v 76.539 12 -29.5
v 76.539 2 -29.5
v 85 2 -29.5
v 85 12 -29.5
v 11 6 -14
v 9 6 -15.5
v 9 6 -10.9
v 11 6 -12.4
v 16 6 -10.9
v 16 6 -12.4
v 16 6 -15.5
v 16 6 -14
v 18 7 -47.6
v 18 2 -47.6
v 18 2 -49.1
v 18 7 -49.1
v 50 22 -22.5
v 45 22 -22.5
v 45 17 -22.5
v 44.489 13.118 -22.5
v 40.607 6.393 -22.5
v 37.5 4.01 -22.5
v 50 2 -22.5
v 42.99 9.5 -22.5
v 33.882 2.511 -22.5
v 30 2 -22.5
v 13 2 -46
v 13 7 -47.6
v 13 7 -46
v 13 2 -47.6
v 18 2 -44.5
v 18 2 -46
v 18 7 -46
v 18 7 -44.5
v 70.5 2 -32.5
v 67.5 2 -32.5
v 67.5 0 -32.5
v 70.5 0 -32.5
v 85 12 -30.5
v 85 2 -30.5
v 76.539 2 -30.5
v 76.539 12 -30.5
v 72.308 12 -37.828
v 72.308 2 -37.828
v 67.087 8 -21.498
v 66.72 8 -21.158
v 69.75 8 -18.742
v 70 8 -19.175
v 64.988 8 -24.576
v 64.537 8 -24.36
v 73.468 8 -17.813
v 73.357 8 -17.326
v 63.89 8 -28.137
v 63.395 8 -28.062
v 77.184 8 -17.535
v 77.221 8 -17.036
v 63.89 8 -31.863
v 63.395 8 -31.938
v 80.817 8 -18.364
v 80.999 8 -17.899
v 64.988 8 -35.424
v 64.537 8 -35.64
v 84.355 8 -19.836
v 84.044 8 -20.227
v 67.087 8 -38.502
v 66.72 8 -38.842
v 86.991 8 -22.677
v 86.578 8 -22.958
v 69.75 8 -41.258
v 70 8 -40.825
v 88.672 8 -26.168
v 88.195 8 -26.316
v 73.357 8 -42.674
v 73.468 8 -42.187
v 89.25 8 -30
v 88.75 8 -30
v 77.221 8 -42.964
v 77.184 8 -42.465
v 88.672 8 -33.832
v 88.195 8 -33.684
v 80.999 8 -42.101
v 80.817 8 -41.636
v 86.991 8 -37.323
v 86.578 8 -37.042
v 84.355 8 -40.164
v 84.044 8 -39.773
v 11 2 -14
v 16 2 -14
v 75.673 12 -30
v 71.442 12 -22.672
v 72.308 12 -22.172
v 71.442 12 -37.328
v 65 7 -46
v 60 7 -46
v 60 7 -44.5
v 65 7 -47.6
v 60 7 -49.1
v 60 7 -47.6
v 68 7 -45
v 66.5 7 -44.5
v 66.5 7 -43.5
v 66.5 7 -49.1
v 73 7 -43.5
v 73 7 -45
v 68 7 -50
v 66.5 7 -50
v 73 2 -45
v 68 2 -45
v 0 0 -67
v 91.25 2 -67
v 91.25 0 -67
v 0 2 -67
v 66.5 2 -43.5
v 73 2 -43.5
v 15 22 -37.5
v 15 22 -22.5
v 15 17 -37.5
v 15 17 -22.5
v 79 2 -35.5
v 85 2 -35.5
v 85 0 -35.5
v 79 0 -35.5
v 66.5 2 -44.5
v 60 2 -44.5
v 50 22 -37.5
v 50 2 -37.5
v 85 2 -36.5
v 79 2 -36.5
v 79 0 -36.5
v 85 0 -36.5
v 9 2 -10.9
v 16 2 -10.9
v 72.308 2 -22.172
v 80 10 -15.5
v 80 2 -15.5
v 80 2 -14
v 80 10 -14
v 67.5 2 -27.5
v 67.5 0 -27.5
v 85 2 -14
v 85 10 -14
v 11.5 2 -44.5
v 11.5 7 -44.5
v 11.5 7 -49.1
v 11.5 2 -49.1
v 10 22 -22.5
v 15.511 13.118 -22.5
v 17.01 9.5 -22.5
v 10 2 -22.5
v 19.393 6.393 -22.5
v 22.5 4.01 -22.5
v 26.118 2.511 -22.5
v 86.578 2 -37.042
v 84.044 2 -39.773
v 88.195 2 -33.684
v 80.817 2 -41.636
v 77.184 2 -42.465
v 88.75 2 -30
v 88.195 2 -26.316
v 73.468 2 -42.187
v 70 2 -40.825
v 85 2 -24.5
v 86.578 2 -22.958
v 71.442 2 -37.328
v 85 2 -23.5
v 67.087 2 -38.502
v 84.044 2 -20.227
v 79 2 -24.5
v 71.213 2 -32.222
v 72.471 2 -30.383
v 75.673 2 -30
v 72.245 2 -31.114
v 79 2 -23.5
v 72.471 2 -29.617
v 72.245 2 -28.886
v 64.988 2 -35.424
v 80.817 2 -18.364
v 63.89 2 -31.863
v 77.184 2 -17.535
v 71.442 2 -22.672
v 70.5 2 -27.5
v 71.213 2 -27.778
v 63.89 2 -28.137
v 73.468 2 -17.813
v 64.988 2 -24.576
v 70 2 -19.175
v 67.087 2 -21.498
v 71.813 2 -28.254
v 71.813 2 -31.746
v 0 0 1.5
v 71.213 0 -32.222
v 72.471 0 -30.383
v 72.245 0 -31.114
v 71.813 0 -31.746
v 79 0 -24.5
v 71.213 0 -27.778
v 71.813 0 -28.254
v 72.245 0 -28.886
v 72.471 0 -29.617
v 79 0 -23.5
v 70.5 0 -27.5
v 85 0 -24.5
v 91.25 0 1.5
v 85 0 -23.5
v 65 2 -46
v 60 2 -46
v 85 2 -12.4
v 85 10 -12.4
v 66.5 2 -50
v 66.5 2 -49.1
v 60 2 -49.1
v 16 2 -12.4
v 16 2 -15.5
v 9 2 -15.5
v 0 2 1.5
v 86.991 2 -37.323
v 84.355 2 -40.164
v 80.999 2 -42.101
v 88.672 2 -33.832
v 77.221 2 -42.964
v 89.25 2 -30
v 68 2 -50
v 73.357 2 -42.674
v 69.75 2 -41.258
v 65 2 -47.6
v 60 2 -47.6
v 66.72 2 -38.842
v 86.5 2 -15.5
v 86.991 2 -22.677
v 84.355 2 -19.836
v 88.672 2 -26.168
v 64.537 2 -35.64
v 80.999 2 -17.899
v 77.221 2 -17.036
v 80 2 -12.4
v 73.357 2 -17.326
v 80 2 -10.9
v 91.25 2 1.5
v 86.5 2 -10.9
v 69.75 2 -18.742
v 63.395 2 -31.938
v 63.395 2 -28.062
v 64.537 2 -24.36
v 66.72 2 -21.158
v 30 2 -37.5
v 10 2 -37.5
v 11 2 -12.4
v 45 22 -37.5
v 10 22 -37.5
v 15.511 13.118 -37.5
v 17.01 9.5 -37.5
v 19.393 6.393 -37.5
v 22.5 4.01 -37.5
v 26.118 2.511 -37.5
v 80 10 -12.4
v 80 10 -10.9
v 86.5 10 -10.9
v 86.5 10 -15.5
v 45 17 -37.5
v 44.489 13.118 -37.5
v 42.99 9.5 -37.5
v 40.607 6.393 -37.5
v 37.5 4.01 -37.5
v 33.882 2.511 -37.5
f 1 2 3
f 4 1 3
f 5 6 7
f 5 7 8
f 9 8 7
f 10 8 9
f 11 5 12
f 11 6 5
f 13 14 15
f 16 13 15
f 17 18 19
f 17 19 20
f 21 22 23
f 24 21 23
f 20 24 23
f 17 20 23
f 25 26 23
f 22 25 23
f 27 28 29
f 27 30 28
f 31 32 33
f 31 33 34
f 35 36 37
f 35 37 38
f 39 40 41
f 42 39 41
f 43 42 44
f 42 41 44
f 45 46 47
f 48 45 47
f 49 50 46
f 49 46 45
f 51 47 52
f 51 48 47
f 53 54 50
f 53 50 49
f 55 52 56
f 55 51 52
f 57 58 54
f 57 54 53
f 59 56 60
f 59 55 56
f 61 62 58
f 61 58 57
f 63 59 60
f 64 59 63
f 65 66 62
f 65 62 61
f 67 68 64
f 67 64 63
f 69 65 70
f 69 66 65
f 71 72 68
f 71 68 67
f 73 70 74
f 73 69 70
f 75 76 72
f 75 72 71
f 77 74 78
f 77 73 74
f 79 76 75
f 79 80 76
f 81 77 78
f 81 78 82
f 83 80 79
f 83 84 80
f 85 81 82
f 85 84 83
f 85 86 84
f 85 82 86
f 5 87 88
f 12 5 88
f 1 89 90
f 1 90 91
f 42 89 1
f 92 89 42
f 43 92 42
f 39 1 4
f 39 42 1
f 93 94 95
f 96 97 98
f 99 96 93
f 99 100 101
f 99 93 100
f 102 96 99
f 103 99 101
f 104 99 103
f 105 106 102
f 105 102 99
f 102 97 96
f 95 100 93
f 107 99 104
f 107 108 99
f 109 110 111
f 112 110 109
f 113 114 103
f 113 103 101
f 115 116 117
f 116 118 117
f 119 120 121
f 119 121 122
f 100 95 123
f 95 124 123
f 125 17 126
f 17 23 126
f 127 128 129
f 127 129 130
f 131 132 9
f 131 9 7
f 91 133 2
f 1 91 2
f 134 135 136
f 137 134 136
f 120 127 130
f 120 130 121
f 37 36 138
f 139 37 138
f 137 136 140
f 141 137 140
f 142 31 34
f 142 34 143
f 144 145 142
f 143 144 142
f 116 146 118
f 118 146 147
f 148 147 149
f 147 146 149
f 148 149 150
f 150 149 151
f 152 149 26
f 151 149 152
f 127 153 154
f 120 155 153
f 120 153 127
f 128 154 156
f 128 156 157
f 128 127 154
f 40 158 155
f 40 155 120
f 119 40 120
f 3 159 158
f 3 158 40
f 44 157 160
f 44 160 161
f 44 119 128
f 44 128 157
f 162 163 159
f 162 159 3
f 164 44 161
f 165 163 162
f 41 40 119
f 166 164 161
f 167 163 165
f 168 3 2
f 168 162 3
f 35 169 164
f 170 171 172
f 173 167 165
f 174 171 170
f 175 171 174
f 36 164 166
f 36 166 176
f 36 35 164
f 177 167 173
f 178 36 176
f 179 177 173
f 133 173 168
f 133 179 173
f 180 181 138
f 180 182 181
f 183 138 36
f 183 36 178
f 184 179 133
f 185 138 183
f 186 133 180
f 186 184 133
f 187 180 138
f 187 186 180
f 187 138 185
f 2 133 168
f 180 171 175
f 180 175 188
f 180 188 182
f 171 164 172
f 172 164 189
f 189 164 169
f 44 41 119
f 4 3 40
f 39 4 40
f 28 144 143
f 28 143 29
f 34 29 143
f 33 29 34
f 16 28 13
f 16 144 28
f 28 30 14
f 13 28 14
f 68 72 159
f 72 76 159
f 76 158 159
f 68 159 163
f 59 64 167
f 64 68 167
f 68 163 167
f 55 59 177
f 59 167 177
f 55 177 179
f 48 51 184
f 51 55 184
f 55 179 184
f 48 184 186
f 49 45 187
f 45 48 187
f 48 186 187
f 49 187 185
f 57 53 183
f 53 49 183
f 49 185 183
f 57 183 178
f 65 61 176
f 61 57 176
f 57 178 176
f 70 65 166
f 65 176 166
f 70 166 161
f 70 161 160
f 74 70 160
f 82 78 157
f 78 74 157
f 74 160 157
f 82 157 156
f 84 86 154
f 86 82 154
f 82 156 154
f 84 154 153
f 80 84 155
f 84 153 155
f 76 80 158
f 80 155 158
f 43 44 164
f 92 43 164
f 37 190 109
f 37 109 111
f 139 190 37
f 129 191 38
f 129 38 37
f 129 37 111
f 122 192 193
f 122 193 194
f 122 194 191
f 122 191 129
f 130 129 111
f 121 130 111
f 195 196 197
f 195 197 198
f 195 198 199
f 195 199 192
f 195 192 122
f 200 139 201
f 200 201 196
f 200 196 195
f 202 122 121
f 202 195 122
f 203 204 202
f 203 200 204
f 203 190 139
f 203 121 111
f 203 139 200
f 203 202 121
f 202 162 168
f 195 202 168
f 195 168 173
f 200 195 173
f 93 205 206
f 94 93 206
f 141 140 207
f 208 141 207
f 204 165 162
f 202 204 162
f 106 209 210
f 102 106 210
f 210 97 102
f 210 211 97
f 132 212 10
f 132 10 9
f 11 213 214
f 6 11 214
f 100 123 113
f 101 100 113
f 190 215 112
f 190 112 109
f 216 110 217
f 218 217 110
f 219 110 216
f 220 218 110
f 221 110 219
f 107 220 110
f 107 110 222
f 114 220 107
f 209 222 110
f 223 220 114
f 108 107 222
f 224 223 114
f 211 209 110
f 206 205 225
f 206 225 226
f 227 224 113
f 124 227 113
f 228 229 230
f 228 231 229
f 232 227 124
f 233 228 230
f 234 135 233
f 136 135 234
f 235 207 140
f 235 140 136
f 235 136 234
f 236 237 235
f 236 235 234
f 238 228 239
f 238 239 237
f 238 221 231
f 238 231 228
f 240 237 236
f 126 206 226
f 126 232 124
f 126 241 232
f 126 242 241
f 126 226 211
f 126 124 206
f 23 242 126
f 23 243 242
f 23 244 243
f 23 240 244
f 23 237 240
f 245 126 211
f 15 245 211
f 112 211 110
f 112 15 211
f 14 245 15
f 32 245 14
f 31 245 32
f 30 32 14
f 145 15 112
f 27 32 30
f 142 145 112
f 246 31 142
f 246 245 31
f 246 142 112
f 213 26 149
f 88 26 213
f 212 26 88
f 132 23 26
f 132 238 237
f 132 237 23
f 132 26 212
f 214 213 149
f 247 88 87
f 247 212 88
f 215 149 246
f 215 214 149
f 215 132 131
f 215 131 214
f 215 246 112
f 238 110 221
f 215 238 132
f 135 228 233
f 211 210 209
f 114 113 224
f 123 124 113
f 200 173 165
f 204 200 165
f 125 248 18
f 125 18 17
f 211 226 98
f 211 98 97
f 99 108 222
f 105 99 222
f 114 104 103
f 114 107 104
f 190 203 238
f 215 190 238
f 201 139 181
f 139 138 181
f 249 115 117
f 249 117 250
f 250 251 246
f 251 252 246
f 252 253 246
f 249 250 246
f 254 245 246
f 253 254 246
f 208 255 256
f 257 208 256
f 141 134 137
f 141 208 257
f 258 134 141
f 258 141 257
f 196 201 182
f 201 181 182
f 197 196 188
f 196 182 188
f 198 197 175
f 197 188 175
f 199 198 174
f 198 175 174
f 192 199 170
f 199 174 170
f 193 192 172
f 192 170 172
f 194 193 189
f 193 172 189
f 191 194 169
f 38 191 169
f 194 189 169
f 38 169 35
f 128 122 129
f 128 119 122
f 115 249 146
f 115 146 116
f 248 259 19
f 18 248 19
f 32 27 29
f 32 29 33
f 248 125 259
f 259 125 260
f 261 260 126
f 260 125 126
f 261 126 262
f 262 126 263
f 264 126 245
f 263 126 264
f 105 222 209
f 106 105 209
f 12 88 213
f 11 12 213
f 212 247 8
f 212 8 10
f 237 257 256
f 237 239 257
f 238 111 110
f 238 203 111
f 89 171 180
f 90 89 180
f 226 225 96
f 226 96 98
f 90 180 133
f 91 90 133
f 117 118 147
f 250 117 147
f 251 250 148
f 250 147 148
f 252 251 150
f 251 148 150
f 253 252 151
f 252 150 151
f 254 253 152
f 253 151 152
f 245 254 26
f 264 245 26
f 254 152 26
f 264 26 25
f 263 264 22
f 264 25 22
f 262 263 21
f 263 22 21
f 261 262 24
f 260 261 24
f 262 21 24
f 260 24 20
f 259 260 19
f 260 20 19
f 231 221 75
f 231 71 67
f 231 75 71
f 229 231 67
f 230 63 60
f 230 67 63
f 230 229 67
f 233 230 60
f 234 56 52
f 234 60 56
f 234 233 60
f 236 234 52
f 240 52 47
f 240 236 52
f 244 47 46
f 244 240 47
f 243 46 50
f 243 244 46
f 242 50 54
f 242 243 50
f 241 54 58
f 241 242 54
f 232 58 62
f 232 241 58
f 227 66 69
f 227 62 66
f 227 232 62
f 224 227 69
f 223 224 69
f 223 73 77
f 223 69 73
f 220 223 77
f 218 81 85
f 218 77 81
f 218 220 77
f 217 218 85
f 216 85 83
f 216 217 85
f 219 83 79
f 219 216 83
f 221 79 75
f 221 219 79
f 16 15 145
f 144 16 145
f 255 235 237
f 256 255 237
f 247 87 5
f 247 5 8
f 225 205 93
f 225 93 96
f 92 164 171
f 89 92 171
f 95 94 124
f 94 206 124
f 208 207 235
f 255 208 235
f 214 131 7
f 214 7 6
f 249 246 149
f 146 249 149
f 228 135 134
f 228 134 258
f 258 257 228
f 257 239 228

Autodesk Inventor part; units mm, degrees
ref_plane "YZ Plane" through (0, 0, 0) normal (1, 0, 0) x (0, 1, 0)
ref_plane "XZ Plane" through (0, 0, 0) normal (0, 1, 0) x (-1, 0, 0)
ref_plane "XY Plane" through (0, 0, 0) normal (0, 0, 1) x (1, 0, 0)
sketch "Sketch1" plane through (0, 0, 0) normal (0, 1, 0) x (-1, 0, 0)
  line L0 (0, 0) -> (-90, 0)
  line L1 (-90, 0) -> (-90, -60)
  line L2 (-90, -60) -> (0, -60)
  line L3 (0, -60) -> (0, 0)
  dimension "d0" = 90
  dimension "d1" = 60
extrude "Extrusion1" add sketch "Sketch1" along normal blind 2
sketch "Sketch2" plane through (0, 2, 0) normal (0, 1, 0) x (1, 0, 0)
  line L0 (90, 0) -> (90, 60) construction
  line L1 (90, 60) -> (85, 60) construction
  line L2 (90, 60) -> (0, 60) construction
  line L3 (85, 60) -> (85, 0) construction
  line L4 (0, 0) -> (90, 0) construction
  line L5 (85, 30) -> (85, 35.5) construction
  line L6 (85, 35.5) -> (85, 30) construction
  line L7 (85, 30) -> (85, 24.5) construction
  line L8 (85, 24.5) -> (79, 24.5)
  line L9 (79, 24.5) -> (79, 23.5)
  line L10 (79, 23.5) -> (85, 23.5)
  line L11 (85, 23.5) -> (85, 24.5)
  line L12 (85, 35.5) -> (79, 35.5)
  line L13 (79, 35.5) -> (79, 36.5)
  line L14 (79, 36.5) -> (85, 36.5)
  line L15 (85, 36.5) -> (85, 35.5)
  dimension "d4" = 5
  dimension "d5" = 5.5
  dimension "d6" = 5.5
  dimension "d7" = 6
  dimension "d8" = 1
  dimension "d9" = 1
extrude "Extrusion2" cut sketch "Sketch2" against normal through all
sketch "Sketch3" plane through (0, 2, 0) normal (0, 1, 0) x (1, 0, 0)
  line L0 (85, 35.5) -> (79, 35.5) construction
  line L1 (85, 24.5) -> (79, 24.5) construction
  line L2 (79, 35.5) -> (79, 24.5) construction
  line L3 (79, 30) -> (72.5, 30) construction
  line L4 (72.5, 30) -> (72.5, 32.5) construction
  line L5 (72.5, 32.5) -> (67.5, 32.5) construction
  line L6 (67.5, 32.5) -> (67.5, 27.5) construction
  line L7 (67.5, 27.5) -> (72.5, 27.5) construction
  line L8 (72.5, 27.5) -> (72.5, 32.5) construction
  line L9 (67.5, 27.5) -> (70.5, 27.5) construction
  line L10 (67.5, 32.5) -> (70.5, 32.5) construction
  arc A0 (70.5, 27.5) -> (70.5, 32.5) centre (69.9375, 30) ccw
  line L11 (70.5, 32.5) -> (67.5, 32.5) construction
  line L12 (67.5, 32.5) -> (67.5, 27.5) construction
  line L13 (67.5, 32.5) -> (70.5, 32.5)
  line L14 (67.5, 32.5) -> (67.5, 27.5)
  line L15 (67.5, 27.5) -> (70.5, 27.5)
  point P0 (0, 0)
  dimension "d12" = 6.5
  dimension "d15" = 2.5
  dimension "d16" = 5
  dimension "d17" = 5
  dimension "d18" = 3
  dimension "d19" = 3
extrude "Extrusion3" cut sketch "Sketch3" against normal through all
sketch "Sketch5" plane through (0, 2, 0) normal (0, 1, 0) x (1, 0, 0)
  line L0 (85, 35.5) -> (85, 36.5) construction
  line L1 (85, 36.5) -> (67.5, 36.5) construction
  line L2 (67.5, 36.5) -> (67.5, 23.5) construction
  line L3 (67.5, 23.5) -> (85, 23.5) construction
  line L4 (85, 23.5) -> (85, 36.5) construction
  circle A0 centre (76.25, 30) radius 12.5 construction
  line L5 (76.25, 30) -> (85, 30) construction
  line L6 (85, 30) -> (85, 30.5) construction
  line L7 (85, 30.5) -> (76.25, 30.5)
  line L8 (76.25, 30.5) -> (76.25, 29.5)
  line L9 (76.25, 29.5) -> (85, 29.5)
  line L10 (85, 29.5) -> (85, 30.5)
  line L11 (76.25, 30) -> (71.875, 37.5777) construction
  line L12 (71.875, 37.5777) -> (71.442, 37.3277) construction
  line L13 (71.442, 37.3277) -> (75.817, 29.75)
  line L14 (75.817, 29.75) -> (76.683, 30.25)
  line L15 (76.683, 30.25) -> (72.308, 37.8277)
  line L16 (72.308, 37.8277) -> (71.442, 37.3277)
  line L17 (76.25, 30) -> (71.875, 22.4223) construction
  line L18 (71.875, 22.4223) -> (72.308, 22.1723) construction
  line L19 (72.308, 22.1723) -> (76.683, 29.75)
  line L20 (76.683, 29.75) -> (75.817, 30.25)
  line L21 (75.817, 30.25) -> (71.442, 22.6723)
  line L22 (71.442, 22.6723) -> (72.308, 22.1723)
  point P0 (0, 0)
  dimension "d32" = 13
  dimension "d33" = 25
  dimension "d34" = 0.5
  dimension "d35" = 1
  dimension "d38" = 360
extrude "Extrusion4" add sketch "Sketch5" along normal blind 10
sketch "Sketch6" plane through (0, 2, 0) normal (0, 1, 0) x (1, 0, 0)
  line L0 (85, 36.5) -> (85, 35.5) construction
  line L1 (85, 36.5) -> (67.5, 36.5) construction
  line L2 (67.5, 36.5) -> (67.5, 23.5) construction
  line L3 (67.5, 23.5) -> (85, 23.5) construction
  line L4 (85, 23.5) -> (85, 36.5) construction
  circle A0 centre (76.25, 30) radius 12.5
  circle A1 centre (76.25, 30) radius 13
  point P0 (0, 0)
  dimension "d42" = 13
  dimension "d43" = 25
  dimension "d44" = 26
extrude "Extrusion5" add sketch "Sketch6" along normal blind 6
sketch "Sketch7" plane through (0, 2, 0) normal (0, 1, 0) x (1, 0, 0)
  line L0 (90, 0) -> (90, 60) construction
  line L1 (90, 30) -> (90, 14) construction
  line L2 (90, 14) -> (0, 14) construction
  line L3 (0, 60) -> (0, 0) construction
  line L4 (90, 14) -> (85, 14) construction
  line L5 (85, 14) -> (11, 14) construction
  line L6 (11, 14) -> (11, 12.4) construction
  line L7 (11, 12.4) -> (85, 12.4) construction
  line L8 (85, 12.4) -> (85, 14) construction
  line L9 (85, 14) -> (85, 12.4)
  line L10 (85, 12.4) -> (80, 12.4)
  line L11 (85, 14) -> (80, 14)
  line L12 (80, 14) -> (80, 15.5)
  line L13 (80, 12.4) -> (80, 10.9)
  line L14 (11, 14) -> (16, 14)
  line L15 (16, 14) -> (16, 15.5)
  line L16 (16, 15.5) -> (9, 15.5)
  line L17 (11, 14) -> (11, 12.4)
  line L18 (11, 12.4) -> (16, 12.4)
  line L19 (16, 12.4) -> (16, 10.9)
  line L20 (16, 10.9) -> (9, 10.9)
  line L21 (9, 10.9) -> (9, 15.5)
  line L22 (80, 15.5) -> (86.5, 15.5)
  line L23 (80, 10.9) -> (86.5, 10.9)
  line L24 (86.5, 10.9) -> (86.5, 15.5)
  dimension "d47" = 16
  dimension "d48" = 5
  dimension "d49" = 74
  dimension "d50" = 1.6
  dimension "d51" = 5
  dimension "d52" = 5
  dimension "d53" = 1.5
  dimension "d55" = 1.5
  dimension "d57" = 5
  dimension "d58" = 1.5
  dimension "d59" = 7
  dimension "d60" = 5
  dimension "d61" = 1.5
  dimension "d62" = 6.5
  dimension "d63" = 6.5
extrude "Extrusion6" add sketch "Sketch7" along normal blind 4
sketch "Sketch8" plane through (0, 6, 0) normal (0, 1, 0) x (1, 0, 0)
  line L0 (80, 15.5) -> (80, 14) projected
  line L1 (80, 14) -> (80, 15.5)
  line L2 (86.5, 10.9) -> (86.5, 15.5) projected
  line L3 (80, 15.5) -> (86.5, 15.5)
  line L4 (86.5, 15.5) -> (86.5, 10.9)
  line L5 (80, 12.4) -> (80, 10.9) projected
  line L6 (86.5, 10.9) -> (80, 10.9)
  line L7 (80, 10.9) -> (80, 12.4)
  line L8 (85, 12.4) -> (80, 12.4) projected
  line L9 (80, 12.4) -> (85, 12.4)
  line L10 (85, 14) -> (85, 12.4) projected
  line L11 (85, 12.4) -> (85, 14)
  line L12 (80, 14) -> (85, 14) projected
  line L13 (85, 14) -> (80, 14)
  point P0 (0, 0)
extrude "Extrusion7" add sketch "Sketch8" along normal blind 4
sketch "Sketch10" plane through (0, 2, 0) normal (0, 1, 0) x (1, 0, 0)
  line L0 (90, 0) -> (90, 60) construction
  line L1 (90, 30) -> (50, 30) construction
  line L2 (50, 30) -> (50, 37.5) construction
  line L3 (50, 37.5) -> (10, 37.5)
  line L4 (10, 37.5) -> (10, 22.5)
  line L5 (10, 22.5) -> (50, 22.5)
  line L6 (50, 22.5) -> (50, 37.5)
  point P0 (0, 0)
  dimension "d82" = 40
  dimension "d83" = 7.5
  dimension "d84" = 40
  dimension "d85" = 15
extrude "Extrusion9" add sketch "Sketch10" along normal blind 15
sketch "Sketch11" plane through (10, 2, -22.5) normal (0, 0, 1) x (1, 0, 0)
  line L0 (0, 0) -> (0, 15) construction
  line L1 (0, 15) -> (20, 15) construction
  line L2 (40, 15) -> (0, 15) construction
  arc A0 (5, 15) -> (35, 15) centre (20, 15) ccw
  line L3 (5, 15) -> (35, 15)
  point P0 (-10, -2)
  dimension "d88" = 30
extrude "Extrusion10" cut sketch "Sketch11" against normal blind 15
sketch "Sketch15" plane through (0, 2, 0) normal (0, 1, 0) x (1, 0, 0)
  line L0 (90, 0) -> (90, 60) construction
  line L1 (90, 30) -> (90, 45) construction
  line L2 (90, 45) -> (90, 45) construction
  line L3 (90, 45) -> (68, 45) construction
  line L4 (68, 45) -> (68, 65) construction
  line L5 (68, 65) -> (90, 65) construction
  line L6 (90, 65) -> (90, 45) construction
  line L7 (68, 45) -> (68, 50)
  line L8 (68, 50) -> (66.5, 50)
  line L9 (66.5, 50) -> (66.5, 45)
  line L10 (66.5, 45) -> (66.5, 43.5)
  line L11 (68, 45) -> (73, 45)
  line L12 (73, 45) -> (73, 43.5)
  line L13 (73, 43.5) -> (66.5, 43.5)
  line L14 (90, 60) -> (0, 60) projected
  point P0 (0, 0)
  dimension "d99" = 15
  dimension "d100" = 0
  dimension "d101" = 22
  dimension "d102" = 20
  dimension "d103" = 5
  dimension "d104" = 1.5
  dimension "d105" = 5
  dimension "d106" = 1.5
extrude "Extrusion13" add sketch "Sketch15" along normal blind 5
sketch "Sketch17" plane through (0, 17, 0) normal (0, 1, 0) x (1, 0, 0)
  line L0 (50, 37.5) -> (45, 37.5) projected
  line L1 (45, 22.5) -> (30, 22.5) projected
  line L2 (50, 37.5) -> (45, 37.5)
  line L3 (45, 37.5) -> (45, 22.5)
  line L4 (45, 22.5) -> (50, 22.5)
  line L5 (50, 22.5) -> (50, 37.5)
  line L6 (15, 37.5) -> (30, 37.5) projected
  line L7 (30, 22.5) -> (10, 22.5) projected
  line L8 (15, 37.5) -> (10, 37.5)
  line L9 (10, 37.5) -> (10, 22.5)
  line L10 (10, 22.5) -> (15, 22.5)
  line L11 (15, 22.5) -> (15, 37.5)
  point P0 (0, 0)
extrude "Extrusion14" add sketch "Sketch17" along normal blind 5
sketch "Sketch18" plane through (0, 2, 0) normal (0, 1, 0) x (1, 0, 0)
  line L0 (90, 0) -> (90, 60) construction
  line L1 (90, 30) -> (90, 46) construction
  line L2 (90, 46) -> (0, 46) construction
  line L3 (66.5, 43.5) -> (66.5, 50) construction
  line L4 (66.5, 46) -> (65, 46) construction
  line L5 (65, 46) -> (13, 46) construction
  line L6 (13, 46) -> (13, 47.6) construction
  line L7 (13, 47.6) -> (65, 47.6) construction
  line L8 (65, 47.6) -> (65, 46) construction
  line L9 (65, 46) -> (60, 46)
  line L10 (60, 46) -> (60, 44.5)
  line L11 (60, 44.5) -> (66.5, 44.5)
  line L12 (65, 46) -> (65, 47.6)
  line L13 (65, 47.6) -> (60, 47.6)
  line L14 (60, 47.6) -> (60, 49.1)
  line L15 (60, 49.1) -> (66.5, 49.1)
  line L16 (66.5, 49.1) -> (66.5, 44.5)
  line L17 (13, 47.6) -> (13, 46)
  line L18 (13, 46) -> (18, 46)
  line L19 (18, 46) -> (18, 44.5)
  line L20 (18, 44.5) -> (11.5, 44.5)
  line L21 (13, 47.6) -> (18, 47.6)
  line L22 (18, 47.6) -> (18, 49.1)
  line L23 (18, 49.1) -> (11.5, 49.1)
  line L24 (11.5, 49.1) -> (11.5, 44.5)
  point P0 (0, 0)
  dimension "d115" = 16
  dimension "d116" = 1.5
  dimension "d117" = 52
  dimension "d118" = 1.6
  dimension "d119" = 5
  dimension "d120" = 1.5
  dimension "d121" = 5
  dimension "d122" = 1.5
  dimension "d123" = 5
  dimension "d124" = 1.5
  dimension "d125" = 6.5
  dimension "d126" = 1.5
extrude "Extrusion15" add sketch "Sketch18" along normal blind 5
sketch "Sketch19" plane through (0, 0, 0) normal (0, 0, 1) x (1, 0, 0)
  line L0 (90, 2) -> (0, 2) projected
  line L1 (90, 0) -> (0, 0) projected
  line L2 (0, 2) -> (90, 2)
  line L3 (90, 2) -> (90, 0)
  line L4 (90, 0) -> (0, 0)
  line L5 (0, 0) -> (0, 2)
extrude "Extrusion16" add sketch "Sketch19" along normal blind 1.5
sketch "Sketch20" plane through (90, 0, -60) normal (1, 0, 0) x (0, 0, -1)
  line L0 (0, 0) -> (0, 2) projected
  line L1 (0, 2) -> (-61.5, 2) projected
  line L2 (0, 0) -> (-61.5, 0)
  line L3 (-61.5, 0) -> (-61.5, 2)
  line L4 (-61.5, 2) -> (0, 2)
  line L5 (0, 2) -> (0, 0)
  point P0 (-60, 0)
extrude "Extrusion17" add sketch "Sketch20" along normal blind 1.25
sketch "Sketch21" plane through (0, 0, -60) normal (0, 0, -1) x (-1, 0, 0)
  line L0 (0, 0) -> (-91.25, 0)
  line L1 (-91.25, 0) -> (-91.25, 2)
  line L2 (-91.25, 2) -> (0, 2)
  line L3 (0, 2) -> (0, 0)
extrude "Extrusion18" add sketch "Sketch21" along normal blind 7
sketch "Sketch22" plane through (0, 2, 0) normal (0, 1, 0) x (1, 0, 0)
  line L0 (85, 30.5) -> (85, 29.5) construction
  line L1 (91.25, -1.5) -> (91.25, 67) construction
  line L2 (91.25, 30) -> (89.25, 30) construction
  line L3 (89.25, 30) -> (87.75, 30) construction
  line L4 (87.75, 30) -> (87.75, 18.5) construction
  line L5 (87.75, 18.5) -> (50.75, 18.5) construction
  line L6 (50.75, 18.5) -> (50.75, 41.5) construction
  line L7 (50.75, 41.5) -> (87.75, 41.5) construction
  line L8 (87.75, 41.5) -> (87.75, 18.5) construction
  point P0 (0, 0)
  dimension "d135" = 2
  dimension "d136" = 1.5
  dimension "d137" = 11.5
  dimension "d138" = 37
  dimension "d139" = 23
properties part number "base"
